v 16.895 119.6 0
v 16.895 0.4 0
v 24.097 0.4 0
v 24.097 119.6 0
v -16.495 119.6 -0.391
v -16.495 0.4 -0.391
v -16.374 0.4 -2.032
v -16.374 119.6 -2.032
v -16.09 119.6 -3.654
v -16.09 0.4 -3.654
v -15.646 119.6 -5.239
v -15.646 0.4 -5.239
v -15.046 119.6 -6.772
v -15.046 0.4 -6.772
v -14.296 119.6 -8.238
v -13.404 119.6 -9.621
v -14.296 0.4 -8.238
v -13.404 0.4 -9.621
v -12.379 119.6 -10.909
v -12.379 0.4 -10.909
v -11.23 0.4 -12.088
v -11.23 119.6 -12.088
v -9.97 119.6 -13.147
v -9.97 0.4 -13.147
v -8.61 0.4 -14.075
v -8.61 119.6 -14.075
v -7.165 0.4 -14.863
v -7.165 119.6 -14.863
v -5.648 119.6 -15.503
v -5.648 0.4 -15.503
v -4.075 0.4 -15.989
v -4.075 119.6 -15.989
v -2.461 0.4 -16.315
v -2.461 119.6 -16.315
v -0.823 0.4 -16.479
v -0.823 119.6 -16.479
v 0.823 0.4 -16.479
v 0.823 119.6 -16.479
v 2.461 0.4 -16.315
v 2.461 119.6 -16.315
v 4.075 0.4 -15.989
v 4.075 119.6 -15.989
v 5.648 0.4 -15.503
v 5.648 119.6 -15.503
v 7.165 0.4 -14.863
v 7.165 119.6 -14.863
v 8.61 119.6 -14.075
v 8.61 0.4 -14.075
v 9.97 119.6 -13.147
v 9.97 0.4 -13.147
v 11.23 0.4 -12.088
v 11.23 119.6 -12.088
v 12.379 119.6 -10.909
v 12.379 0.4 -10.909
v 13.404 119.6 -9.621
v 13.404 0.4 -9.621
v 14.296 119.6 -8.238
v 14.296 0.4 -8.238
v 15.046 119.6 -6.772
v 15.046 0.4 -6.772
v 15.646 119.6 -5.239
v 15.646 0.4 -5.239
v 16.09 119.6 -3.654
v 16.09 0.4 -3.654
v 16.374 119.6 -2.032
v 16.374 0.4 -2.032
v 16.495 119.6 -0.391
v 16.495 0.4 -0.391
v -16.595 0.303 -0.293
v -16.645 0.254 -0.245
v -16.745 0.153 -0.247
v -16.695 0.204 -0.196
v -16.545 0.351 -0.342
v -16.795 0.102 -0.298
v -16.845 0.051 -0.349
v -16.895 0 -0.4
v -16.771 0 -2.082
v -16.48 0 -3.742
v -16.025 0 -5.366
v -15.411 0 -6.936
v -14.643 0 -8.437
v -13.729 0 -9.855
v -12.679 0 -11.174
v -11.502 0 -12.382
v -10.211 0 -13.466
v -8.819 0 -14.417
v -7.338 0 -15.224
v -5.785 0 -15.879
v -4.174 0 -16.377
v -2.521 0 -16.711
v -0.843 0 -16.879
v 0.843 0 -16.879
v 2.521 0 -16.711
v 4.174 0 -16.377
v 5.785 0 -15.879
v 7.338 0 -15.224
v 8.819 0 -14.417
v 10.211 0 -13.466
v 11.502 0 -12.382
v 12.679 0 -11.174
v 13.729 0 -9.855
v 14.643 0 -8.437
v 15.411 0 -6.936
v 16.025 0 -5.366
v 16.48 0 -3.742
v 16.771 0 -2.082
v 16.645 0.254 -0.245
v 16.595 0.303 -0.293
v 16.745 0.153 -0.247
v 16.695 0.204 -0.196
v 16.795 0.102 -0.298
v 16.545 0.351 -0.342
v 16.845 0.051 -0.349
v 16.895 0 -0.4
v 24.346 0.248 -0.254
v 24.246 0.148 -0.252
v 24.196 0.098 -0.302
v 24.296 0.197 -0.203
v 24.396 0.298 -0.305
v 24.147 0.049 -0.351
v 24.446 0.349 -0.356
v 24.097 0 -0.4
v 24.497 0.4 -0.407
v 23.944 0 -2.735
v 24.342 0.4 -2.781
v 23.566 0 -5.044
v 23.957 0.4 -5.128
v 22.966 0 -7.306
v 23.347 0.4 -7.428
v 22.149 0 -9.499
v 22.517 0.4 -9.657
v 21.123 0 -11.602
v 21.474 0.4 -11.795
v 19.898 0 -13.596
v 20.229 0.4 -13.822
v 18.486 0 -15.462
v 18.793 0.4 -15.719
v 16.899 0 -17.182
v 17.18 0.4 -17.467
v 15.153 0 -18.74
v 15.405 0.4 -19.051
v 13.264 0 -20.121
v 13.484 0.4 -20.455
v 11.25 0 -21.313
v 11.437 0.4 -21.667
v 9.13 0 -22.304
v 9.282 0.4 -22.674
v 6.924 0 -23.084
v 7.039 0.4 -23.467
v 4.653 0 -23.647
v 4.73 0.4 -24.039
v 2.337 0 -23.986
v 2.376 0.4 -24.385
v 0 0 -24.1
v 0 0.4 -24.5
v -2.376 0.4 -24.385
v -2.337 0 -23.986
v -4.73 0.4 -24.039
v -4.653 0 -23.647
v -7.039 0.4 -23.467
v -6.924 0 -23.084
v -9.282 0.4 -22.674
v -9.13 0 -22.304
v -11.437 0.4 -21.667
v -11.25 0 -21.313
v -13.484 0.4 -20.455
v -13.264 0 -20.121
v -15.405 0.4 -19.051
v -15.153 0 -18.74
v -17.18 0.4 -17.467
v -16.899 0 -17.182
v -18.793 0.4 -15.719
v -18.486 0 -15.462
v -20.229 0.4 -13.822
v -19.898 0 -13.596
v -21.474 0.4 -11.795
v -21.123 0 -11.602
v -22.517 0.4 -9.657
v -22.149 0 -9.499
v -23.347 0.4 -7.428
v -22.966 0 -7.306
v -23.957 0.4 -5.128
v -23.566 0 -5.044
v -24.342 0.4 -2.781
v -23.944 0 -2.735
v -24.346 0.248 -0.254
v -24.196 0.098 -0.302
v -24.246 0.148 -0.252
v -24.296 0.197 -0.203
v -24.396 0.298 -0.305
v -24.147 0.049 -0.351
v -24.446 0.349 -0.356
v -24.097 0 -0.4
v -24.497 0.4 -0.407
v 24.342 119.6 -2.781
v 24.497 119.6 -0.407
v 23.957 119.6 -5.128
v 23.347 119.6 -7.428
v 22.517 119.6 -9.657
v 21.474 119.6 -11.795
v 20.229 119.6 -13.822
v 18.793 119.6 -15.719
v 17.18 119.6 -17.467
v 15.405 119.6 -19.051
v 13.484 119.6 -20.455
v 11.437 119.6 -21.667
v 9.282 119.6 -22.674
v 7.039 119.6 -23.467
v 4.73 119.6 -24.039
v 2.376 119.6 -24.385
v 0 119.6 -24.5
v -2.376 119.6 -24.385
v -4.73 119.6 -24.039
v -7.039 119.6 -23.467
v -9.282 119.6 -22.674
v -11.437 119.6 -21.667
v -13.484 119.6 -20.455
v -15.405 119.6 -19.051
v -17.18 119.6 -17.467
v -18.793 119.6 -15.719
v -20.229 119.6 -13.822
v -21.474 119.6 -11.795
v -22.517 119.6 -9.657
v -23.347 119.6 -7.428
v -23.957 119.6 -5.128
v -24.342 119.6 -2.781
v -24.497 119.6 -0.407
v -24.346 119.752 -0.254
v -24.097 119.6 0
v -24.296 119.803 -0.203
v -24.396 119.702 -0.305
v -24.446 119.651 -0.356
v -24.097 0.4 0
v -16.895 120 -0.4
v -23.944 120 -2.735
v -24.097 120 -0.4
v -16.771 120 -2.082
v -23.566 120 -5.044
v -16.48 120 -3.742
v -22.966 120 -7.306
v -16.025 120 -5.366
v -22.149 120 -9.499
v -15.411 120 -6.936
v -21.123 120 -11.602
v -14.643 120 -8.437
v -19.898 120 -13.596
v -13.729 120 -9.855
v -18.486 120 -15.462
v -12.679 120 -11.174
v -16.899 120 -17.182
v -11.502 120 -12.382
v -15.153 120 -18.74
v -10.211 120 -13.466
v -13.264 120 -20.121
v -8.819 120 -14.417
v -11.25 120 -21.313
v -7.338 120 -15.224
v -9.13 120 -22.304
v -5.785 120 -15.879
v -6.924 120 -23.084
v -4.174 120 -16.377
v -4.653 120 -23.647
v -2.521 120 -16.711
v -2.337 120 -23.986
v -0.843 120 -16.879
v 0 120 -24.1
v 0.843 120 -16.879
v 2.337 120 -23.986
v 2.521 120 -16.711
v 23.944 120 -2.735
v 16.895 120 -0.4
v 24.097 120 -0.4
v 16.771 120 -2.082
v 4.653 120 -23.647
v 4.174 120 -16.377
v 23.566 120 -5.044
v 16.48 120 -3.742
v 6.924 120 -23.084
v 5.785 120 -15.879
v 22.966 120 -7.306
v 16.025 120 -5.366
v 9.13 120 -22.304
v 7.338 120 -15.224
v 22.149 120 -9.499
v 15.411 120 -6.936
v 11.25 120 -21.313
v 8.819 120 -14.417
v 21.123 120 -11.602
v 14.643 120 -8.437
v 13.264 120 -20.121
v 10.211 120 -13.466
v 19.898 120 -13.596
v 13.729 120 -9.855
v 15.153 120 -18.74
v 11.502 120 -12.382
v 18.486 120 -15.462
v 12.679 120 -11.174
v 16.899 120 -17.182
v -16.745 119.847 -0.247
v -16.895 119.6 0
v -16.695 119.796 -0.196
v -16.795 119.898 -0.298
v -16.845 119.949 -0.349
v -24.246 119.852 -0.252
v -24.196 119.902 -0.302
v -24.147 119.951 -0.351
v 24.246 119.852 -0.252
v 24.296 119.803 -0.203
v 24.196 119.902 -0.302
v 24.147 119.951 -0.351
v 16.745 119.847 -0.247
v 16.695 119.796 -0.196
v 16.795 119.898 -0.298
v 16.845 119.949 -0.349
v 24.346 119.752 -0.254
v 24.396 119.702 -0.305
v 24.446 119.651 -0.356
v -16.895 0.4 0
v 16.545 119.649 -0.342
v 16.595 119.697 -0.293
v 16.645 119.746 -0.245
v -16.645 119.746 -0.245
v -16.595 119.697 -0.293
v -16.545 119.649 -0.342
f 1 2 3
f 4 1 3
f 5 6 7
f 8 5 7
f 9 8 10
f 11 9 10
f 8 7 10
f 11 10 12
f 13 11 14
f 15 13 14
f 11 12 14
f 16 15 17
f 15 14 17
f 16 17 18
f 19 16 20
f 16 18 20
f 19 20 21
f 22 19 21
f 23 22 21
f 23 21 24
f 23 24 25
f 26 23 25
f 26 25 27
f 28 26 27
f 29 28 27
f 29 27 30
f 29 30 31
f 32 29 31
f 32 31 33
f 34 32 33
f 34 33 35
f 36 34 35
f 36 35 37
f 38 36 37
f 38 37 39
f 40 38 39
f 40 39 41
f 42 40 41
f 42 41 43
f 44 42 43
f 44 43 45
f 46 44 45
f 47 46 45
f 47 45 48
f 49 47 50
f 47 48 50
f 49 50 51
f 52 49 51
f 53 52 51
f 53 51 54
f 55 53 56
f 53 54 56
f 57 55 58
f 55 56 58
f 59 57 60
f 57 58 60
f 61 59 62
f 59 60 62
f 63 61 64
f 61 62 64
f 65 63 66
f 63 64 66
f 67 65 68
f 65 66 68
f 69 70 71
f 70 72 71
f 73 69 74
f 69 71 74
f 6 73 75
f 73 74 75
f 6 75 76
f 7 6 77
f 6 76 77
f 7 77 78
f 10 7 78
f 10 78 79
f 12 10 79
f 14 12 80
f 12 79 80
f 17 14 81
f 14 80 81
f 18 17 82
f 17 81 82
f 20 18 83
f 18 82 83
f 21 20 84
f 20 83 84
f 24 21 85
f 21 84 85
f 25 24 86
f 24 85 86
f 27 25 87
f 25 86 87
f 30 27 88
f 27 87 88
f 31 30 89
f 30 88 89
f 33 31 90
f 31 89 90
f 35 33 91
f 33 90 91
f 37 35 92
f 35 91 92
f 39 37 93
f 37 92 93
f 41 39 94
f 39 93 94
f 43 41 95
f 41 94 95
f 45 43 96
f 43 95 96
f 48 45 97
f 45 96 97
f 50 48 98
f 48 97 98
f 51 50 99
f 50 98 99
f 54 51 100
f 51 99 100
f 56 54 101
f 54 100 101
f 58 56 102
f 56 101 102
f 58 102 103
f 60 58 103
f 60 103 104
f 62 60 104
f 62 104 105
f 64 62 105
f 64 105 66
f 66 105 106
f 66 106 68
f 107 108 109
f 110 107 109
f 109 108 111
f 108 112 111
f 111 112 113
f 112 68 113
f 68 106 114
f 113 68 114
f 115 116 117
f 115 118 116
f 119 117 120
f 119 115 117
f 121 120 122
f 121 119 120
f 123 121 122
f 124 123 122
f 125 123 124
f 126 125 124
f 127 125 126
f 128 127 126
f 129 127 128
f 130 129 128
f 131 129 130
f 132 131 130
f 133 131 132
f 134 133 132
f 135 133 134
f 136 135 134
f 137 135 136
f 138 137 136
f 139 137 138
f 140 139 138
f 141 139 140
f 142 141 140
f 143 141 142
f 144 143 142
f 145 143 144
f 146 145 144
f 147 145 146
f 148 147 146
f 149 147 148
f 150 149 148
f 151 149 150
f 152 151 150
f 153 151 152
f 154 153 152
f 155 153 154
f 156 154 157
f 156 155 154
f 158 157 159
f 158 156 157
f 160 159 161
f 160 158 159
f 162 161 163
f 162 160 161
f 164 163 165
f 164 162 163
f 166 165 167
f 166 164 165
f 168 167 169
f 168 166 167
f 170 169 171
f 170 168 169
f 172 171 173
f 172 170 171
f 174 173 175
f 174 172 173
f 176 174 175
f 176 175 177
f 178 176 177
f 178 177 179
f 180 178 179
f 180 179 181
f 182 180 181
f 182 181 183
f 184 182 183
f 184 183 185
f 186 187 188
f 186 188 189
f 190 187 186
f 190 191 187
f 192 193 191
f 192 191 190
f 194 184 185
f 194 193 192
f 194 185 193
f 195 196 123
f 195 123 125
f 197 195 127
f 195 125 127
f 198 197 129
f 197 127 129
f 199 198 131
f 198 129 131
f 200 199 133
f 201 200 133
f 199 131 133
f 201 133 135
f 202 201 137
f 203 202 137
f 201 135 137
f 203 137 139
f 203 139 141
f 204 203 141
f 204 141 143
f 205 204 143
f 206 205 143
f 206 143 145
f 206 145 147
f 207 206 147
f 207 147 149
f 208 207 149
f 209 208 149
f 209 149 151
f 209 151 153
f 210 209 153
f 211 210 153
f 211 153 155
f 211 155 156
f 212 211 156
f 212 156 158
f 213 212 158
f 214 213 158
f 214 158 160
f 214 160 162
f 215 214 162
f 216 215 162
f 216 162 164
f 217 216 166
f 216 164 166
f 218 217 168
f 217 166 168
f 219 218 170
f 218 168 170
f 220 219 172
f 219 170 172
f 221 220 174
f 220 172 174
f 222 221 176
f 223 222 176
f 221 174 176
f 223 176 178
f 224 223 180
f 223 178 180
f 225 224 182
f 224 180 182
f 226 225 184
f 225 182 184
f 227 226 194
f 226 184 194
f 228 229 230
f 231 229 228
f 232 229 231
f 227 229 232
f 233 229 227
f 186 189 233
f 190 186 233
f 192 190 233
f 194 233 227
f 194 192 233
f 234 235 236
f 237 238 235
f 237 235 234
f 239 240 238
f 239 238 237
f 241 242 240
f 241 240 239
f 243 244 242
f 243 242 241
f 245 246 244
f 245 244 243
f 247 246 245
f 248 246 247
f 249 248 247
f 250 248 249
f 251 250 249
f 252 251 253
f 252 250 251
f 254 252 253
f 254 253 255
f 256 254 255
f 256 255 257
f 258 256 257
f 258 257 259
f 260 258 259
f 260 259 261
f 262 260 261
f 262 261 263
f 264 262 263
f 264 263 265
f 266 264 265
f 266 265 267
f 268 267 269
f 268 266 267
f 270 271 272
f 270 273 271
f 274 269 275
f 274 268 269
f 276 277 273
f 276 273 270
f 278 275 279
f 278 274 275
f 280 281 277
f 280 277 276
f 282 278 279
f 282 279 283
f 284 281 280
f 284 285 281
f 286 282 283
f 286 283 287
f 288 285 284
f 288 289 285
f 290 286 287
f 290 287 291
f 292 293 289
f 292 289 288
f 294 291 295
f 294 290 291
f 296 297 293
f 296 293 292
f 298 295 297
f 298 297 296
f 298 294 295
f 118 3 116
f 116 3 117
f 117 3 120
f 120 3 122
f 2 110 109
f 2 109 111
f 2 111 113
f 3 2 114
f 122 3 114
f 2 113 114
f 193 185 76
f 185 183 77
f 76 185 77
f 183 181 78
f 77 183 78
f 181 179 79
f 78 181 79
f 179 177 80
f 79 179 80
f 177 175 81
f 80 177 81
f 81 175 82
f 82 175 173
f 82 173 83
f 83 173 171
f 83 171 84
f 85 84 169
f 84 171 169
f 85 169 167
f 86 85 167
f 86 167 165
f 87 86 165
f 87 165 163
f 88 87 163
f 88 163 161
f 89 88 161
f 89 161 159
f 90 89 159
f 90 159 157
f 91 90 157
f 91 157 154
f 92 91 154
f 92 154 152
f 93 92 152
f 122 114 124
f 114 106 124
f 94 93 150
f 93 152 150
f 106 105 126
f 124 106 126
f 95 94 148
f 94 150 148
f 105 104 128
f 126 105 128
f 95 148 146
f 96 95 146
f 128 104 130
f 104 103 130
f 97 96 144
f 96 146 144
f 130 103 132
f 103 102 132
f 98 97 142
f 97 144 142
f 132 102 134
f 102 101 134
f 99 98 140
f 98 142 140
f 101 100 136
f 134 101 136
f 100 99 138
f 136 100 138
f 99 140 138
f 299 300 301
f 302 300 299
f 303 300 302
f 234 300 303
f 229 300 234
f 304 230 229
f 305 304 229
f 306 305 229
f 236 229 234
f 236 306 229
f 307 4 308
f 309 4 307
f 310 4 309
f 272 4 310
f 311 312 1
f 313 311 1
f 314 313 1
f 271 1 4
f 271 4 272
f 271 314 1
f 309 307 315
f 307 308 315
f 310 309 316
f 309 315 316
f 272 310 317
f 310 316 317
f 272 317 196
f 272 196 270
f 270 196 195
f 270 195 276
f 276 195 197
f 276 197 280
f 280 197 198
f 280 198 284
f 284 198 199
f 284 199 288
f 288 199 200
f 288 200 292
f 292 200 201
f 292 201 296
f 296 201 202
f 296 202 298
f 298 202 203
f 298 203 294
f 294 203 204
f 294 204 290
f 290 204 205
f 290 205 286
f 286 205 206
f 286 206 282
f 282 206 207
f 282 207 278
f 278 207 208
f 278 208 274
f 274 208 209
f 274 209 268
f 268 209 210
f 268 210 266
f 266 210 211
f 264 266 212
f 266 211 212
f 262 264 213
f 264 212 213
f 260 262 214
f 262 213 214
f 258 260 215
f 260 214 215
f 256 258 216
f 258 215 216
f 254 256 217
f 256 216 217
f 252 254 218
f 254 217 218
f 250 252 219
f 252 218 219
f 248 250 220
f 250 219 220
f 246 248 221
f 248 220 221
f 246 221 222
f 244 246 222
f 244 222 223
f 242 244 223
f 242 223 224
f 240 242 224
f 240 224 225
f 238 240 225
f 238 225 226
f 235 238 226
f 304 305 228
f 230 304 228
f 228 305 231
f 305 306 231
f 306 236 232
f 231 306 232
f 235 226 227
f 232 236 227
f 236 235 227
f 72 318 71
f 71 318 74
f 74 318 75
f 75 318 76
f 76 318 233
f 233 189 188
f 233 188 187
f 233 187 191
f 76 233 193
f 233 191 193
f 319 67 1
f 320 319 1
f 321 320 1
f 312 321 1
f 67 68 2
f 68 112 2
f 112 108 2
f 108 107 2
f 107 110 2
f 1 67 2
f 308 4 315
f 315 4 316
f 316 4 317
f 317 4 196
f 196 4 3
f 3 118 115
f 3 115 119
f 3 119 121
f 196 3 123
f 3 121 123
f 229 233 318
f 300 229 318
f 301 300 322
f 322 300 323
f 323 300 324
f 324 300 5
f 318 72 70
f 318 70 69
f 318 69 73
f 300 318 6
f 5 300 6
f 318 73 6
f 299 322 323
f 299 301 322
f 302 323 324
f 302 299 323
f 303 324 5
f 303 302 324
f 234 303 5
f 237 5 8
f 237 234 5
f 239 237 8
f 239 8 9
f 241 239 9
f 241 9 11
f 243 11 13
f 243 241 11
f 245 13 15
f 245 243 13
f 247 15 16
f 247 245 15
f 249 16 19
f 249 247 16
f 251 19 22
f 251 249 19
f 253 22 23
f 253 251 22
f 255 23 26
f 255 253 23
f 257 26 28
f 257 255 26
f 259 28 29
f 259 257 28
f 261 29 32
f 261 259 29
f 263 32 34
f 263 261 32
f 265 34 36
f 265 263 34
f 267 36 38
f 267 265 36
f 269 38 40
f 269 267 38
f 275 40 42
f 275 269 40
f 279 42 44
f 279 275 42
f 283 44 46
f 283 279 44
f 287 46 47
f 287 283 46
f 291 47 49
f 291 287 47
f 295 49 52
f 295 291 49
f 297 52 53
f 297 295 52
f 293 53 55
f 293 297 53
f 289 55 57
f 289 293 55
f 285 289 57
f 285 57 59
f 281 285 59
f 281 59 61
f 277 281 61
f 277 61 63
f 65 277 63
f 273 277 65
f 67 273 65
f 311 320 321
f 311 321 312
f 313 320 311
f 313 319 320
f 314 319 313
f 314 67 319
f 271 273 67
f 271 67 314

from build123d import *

# Parameters (mm, degrees)
EXTRUDE_1_DEPTH = 120
CHAMFER_2_SIZE  = 0.4


with BuildPart() as part:
    # 草图1 → 凸台-拉伸1 (new body)
    with BuildSketch(Plane(origin=(0, 0, 0), x_dir=(1, 0, 0), z_dir=(0, 1, 0))):
        with BuildLine():
            Line((-24.5, 0), (-16.5, 0))
            ThreePointArc((-16.5, 0), (0, 16.5), (16.5, 0))
            Line((16.5, 0), (24.5, 0))
            ThreePointArc((24.5, 0), (0, 24.5), (-24.5, 0))
        make_face()
    extrude(amount=EXTRUDE_1_DEPTH)

    # 倒角1
    # the kernel refuses this chamfer: 0.4 mm, written as the material it takes off along each edge
    with BuildSketch(Plane(origin=(15.471326805, 120, 0), x_dir=(0, -0.9996219169112966, 0.027495876610585543), z_dir=(1, 0, 0)), Plane(origin=(-25.528673195, 120, 0), x_dir=(0, -0.9996219169112966, 0.027495876610585543), z_dir=(1, 0, 0))) as chamfer_1_piece_1:
        with BuildLine():
            Line((0.411469278, 0), (-0.022618862, 0.410847117))
            Line((-0.022618862, 0.410847117), (-0.030615837, 0.41062715))
            ThreePointArc((-0.030615837, 0.41062715), (-0.013651691, 0.205359132), (-0.007996975, -0.000219967))
            Line((-0.007996975, -0.000219967), (0.000219967, -0.007996975))
            ThreePointArc((0.000219967, -0.007996975), (0.205799066, -0.00234226), (0.411689245, -0.007996975))
            Line((0.411689245, -0.007996975), (0.411469278, 0))
        make_face()
    extrude(amount=10.05734639, mode=Mode.SUBTRACT)
    with BuildSketch(Plane(origin=(15.471326805, 0, 0), x_dir=(0, 0.9996219169112968, 0.02749587661058639), z_dir=(1, 0, 0)), Plane(origin=(-25.528673195, 0, 0), x_dir=(0, 0.9996219169112968, 0.02749587661058639), z_dir=(1, 0, 0))) as chamfer_1_piece_2:
        with BuildLine():
            Line((0.411469278, 0), (-0.022618862, -0.410847117))
            Line((-0.022618862, -0.410847117), (-0.030615837, -0.41062715))
            ThreePointArc((-0.030615837, -0.41062715), (-0.013651691, -0.205359132), (-0.007996975, 0.000219967))
            Line((-0.007996975, 0.000219967), (0.000219967, 0.007996975))
            ThreePointArc((0.000219967, 0.007996975), (0.205799066, 0.00234226), (0.411689245, 0.007996975))
            Line((0.411689245, 0.007996975), (0.411469278, 0))
        make_face()
    extrude(amount=10.05734639, mode=Mode.SUBTRACT)
    with BuildSketch(Plane(origin=(24.5, -1.045299528, 0), x_dir=(-0.9996215998180249, 0, 0.0275074022265361), z_dir=(0, 1, 0))) as chamfer_1_piece_3:
        with BuildLine():
            Line((0.414696078, 0), (-0.019340993, -0.417672243))
            Line((-0.019340993, -0.417672243), (-0.027340517, -0.417584944))
            ThreePointArc((-0.027340517, -0.417584944), (-0.012856137, -0.208775648), (-0.007996973, 0.000220059))
            Line((-0.007996973, 0.000220059), (0.000220059, 0.007996973))
            ThreePointArc((0.000220059, 0.007996973), (0.207411207, 0.002295525), (0.414916137, 0.007996973))
            Line((0.414916137, 0.007996973), (0.414696078, 0))
        make_face()
    extrude(amount=122.090599055, mode=Mode.SUBTRACT)
    with BuildSketch(Plane(origin=(16.5, -1.017165076, 0), x_dir=(-0.039969745571149635, 0, -0.9992008904314376), z_dir=(0, 1, 0))) as chamfer_1_piece_4:
        with BuildLine():
            Line((0.402032829, 0), (-0.027426276, -0.405940594))
            Line((-0.027426276, -0.405940594), (-0.035419883, -0.405620836))
            ThreePointArc((-0.035419883, -0.405620836), (-0.016121703, -0.20287395), (-0.007993607, 0.000319758))
            Line((-0.007993607, 0.000319758), (0.000319758, 0.007993607))
            ThreePointArc((0.000319758, 0.007993607), (0.201049453, 0.001188032), (0.4021633, 0.007998936))
            Line((0.4021633, 0.007998936), (0.402032829, 0))
        make_face()
    extrude(amount=122.034330152, mode=Mode.SUBTRACT)
    with BuildSketch(Plane(origin=(-16.5, -1.017165076, 0), x_dir=(-0.9996224657663016, 0, 0.02747591554978717), z_dir=(0, 1, 0))) as chamfer_1_piece_5:
        with BuildLine():
            Line((0.40686603, 0), (-0.027100476, -0.401118387))
            Line((-0.027100476, -0.401118387), (-0.035090013, -0.400709363))
            ThreePointArc((-0.035090013, -0.400709363), (-0.014737795, -0.200512073), (-0.00799698, 0.000219807))
            Line((-0.00799698, 0.000219807), (0.000219807, 0.00799698))
            ThreePointArc((0.000219807, 0.00799698), (0.203499246, 0.002409582), (0.407085838, 0.00799698))
            Line((0.407085838, 0.00799698), (0.40686603, 0))
        make_face()
    extrude(amount=122.034330152, mode=Mode.SUBTRACT)
    with BuildSketch(Plane(origin=(-24.5, -1.045299528, 0), x_dir=(0.9996215998180249, 0, 0.02750740222653502), z_dir=(0, 1, 0))) as chamfer_1_piece_6:
        with BuildLine():
            Line((0.414696078, 0), (-0.019340993, 0.417672243))
            Line((-0.019340993, 0.417672243), (-0.027340517, 0.417584944))
            ThreePointArc((-0.027340517, 0.417584944), (-0.012856137, 0.208775648), (-0.007996973, -0.000220059))
            Line((-0.007996973, -0.000220059), (0.000220059, -0.007996973))
            ThreePointArc((0.000220059, -0.007996973), (0.207411207, -0.002295525), (0.414916137, -0.007996973))
            Line((0.414916137, -0.007996973), (0.414696078, 0))
        make_face()
    extrude(amount=122.090599055, mode=Mode.SUBTRACT)

    # 倒角2
    chamfer_2_edges = [part.edges().sort_by_distance(p)[0] for p in [
        (0, 0, -24.5),
        (0, 0, -16.5),
        (0, 120, -16.5),
        (0, 120, -24.5),
    ]]
    chamfer(chamfer_2_edges, length=CHAMFER_2_SIZE)


solid = part.part
